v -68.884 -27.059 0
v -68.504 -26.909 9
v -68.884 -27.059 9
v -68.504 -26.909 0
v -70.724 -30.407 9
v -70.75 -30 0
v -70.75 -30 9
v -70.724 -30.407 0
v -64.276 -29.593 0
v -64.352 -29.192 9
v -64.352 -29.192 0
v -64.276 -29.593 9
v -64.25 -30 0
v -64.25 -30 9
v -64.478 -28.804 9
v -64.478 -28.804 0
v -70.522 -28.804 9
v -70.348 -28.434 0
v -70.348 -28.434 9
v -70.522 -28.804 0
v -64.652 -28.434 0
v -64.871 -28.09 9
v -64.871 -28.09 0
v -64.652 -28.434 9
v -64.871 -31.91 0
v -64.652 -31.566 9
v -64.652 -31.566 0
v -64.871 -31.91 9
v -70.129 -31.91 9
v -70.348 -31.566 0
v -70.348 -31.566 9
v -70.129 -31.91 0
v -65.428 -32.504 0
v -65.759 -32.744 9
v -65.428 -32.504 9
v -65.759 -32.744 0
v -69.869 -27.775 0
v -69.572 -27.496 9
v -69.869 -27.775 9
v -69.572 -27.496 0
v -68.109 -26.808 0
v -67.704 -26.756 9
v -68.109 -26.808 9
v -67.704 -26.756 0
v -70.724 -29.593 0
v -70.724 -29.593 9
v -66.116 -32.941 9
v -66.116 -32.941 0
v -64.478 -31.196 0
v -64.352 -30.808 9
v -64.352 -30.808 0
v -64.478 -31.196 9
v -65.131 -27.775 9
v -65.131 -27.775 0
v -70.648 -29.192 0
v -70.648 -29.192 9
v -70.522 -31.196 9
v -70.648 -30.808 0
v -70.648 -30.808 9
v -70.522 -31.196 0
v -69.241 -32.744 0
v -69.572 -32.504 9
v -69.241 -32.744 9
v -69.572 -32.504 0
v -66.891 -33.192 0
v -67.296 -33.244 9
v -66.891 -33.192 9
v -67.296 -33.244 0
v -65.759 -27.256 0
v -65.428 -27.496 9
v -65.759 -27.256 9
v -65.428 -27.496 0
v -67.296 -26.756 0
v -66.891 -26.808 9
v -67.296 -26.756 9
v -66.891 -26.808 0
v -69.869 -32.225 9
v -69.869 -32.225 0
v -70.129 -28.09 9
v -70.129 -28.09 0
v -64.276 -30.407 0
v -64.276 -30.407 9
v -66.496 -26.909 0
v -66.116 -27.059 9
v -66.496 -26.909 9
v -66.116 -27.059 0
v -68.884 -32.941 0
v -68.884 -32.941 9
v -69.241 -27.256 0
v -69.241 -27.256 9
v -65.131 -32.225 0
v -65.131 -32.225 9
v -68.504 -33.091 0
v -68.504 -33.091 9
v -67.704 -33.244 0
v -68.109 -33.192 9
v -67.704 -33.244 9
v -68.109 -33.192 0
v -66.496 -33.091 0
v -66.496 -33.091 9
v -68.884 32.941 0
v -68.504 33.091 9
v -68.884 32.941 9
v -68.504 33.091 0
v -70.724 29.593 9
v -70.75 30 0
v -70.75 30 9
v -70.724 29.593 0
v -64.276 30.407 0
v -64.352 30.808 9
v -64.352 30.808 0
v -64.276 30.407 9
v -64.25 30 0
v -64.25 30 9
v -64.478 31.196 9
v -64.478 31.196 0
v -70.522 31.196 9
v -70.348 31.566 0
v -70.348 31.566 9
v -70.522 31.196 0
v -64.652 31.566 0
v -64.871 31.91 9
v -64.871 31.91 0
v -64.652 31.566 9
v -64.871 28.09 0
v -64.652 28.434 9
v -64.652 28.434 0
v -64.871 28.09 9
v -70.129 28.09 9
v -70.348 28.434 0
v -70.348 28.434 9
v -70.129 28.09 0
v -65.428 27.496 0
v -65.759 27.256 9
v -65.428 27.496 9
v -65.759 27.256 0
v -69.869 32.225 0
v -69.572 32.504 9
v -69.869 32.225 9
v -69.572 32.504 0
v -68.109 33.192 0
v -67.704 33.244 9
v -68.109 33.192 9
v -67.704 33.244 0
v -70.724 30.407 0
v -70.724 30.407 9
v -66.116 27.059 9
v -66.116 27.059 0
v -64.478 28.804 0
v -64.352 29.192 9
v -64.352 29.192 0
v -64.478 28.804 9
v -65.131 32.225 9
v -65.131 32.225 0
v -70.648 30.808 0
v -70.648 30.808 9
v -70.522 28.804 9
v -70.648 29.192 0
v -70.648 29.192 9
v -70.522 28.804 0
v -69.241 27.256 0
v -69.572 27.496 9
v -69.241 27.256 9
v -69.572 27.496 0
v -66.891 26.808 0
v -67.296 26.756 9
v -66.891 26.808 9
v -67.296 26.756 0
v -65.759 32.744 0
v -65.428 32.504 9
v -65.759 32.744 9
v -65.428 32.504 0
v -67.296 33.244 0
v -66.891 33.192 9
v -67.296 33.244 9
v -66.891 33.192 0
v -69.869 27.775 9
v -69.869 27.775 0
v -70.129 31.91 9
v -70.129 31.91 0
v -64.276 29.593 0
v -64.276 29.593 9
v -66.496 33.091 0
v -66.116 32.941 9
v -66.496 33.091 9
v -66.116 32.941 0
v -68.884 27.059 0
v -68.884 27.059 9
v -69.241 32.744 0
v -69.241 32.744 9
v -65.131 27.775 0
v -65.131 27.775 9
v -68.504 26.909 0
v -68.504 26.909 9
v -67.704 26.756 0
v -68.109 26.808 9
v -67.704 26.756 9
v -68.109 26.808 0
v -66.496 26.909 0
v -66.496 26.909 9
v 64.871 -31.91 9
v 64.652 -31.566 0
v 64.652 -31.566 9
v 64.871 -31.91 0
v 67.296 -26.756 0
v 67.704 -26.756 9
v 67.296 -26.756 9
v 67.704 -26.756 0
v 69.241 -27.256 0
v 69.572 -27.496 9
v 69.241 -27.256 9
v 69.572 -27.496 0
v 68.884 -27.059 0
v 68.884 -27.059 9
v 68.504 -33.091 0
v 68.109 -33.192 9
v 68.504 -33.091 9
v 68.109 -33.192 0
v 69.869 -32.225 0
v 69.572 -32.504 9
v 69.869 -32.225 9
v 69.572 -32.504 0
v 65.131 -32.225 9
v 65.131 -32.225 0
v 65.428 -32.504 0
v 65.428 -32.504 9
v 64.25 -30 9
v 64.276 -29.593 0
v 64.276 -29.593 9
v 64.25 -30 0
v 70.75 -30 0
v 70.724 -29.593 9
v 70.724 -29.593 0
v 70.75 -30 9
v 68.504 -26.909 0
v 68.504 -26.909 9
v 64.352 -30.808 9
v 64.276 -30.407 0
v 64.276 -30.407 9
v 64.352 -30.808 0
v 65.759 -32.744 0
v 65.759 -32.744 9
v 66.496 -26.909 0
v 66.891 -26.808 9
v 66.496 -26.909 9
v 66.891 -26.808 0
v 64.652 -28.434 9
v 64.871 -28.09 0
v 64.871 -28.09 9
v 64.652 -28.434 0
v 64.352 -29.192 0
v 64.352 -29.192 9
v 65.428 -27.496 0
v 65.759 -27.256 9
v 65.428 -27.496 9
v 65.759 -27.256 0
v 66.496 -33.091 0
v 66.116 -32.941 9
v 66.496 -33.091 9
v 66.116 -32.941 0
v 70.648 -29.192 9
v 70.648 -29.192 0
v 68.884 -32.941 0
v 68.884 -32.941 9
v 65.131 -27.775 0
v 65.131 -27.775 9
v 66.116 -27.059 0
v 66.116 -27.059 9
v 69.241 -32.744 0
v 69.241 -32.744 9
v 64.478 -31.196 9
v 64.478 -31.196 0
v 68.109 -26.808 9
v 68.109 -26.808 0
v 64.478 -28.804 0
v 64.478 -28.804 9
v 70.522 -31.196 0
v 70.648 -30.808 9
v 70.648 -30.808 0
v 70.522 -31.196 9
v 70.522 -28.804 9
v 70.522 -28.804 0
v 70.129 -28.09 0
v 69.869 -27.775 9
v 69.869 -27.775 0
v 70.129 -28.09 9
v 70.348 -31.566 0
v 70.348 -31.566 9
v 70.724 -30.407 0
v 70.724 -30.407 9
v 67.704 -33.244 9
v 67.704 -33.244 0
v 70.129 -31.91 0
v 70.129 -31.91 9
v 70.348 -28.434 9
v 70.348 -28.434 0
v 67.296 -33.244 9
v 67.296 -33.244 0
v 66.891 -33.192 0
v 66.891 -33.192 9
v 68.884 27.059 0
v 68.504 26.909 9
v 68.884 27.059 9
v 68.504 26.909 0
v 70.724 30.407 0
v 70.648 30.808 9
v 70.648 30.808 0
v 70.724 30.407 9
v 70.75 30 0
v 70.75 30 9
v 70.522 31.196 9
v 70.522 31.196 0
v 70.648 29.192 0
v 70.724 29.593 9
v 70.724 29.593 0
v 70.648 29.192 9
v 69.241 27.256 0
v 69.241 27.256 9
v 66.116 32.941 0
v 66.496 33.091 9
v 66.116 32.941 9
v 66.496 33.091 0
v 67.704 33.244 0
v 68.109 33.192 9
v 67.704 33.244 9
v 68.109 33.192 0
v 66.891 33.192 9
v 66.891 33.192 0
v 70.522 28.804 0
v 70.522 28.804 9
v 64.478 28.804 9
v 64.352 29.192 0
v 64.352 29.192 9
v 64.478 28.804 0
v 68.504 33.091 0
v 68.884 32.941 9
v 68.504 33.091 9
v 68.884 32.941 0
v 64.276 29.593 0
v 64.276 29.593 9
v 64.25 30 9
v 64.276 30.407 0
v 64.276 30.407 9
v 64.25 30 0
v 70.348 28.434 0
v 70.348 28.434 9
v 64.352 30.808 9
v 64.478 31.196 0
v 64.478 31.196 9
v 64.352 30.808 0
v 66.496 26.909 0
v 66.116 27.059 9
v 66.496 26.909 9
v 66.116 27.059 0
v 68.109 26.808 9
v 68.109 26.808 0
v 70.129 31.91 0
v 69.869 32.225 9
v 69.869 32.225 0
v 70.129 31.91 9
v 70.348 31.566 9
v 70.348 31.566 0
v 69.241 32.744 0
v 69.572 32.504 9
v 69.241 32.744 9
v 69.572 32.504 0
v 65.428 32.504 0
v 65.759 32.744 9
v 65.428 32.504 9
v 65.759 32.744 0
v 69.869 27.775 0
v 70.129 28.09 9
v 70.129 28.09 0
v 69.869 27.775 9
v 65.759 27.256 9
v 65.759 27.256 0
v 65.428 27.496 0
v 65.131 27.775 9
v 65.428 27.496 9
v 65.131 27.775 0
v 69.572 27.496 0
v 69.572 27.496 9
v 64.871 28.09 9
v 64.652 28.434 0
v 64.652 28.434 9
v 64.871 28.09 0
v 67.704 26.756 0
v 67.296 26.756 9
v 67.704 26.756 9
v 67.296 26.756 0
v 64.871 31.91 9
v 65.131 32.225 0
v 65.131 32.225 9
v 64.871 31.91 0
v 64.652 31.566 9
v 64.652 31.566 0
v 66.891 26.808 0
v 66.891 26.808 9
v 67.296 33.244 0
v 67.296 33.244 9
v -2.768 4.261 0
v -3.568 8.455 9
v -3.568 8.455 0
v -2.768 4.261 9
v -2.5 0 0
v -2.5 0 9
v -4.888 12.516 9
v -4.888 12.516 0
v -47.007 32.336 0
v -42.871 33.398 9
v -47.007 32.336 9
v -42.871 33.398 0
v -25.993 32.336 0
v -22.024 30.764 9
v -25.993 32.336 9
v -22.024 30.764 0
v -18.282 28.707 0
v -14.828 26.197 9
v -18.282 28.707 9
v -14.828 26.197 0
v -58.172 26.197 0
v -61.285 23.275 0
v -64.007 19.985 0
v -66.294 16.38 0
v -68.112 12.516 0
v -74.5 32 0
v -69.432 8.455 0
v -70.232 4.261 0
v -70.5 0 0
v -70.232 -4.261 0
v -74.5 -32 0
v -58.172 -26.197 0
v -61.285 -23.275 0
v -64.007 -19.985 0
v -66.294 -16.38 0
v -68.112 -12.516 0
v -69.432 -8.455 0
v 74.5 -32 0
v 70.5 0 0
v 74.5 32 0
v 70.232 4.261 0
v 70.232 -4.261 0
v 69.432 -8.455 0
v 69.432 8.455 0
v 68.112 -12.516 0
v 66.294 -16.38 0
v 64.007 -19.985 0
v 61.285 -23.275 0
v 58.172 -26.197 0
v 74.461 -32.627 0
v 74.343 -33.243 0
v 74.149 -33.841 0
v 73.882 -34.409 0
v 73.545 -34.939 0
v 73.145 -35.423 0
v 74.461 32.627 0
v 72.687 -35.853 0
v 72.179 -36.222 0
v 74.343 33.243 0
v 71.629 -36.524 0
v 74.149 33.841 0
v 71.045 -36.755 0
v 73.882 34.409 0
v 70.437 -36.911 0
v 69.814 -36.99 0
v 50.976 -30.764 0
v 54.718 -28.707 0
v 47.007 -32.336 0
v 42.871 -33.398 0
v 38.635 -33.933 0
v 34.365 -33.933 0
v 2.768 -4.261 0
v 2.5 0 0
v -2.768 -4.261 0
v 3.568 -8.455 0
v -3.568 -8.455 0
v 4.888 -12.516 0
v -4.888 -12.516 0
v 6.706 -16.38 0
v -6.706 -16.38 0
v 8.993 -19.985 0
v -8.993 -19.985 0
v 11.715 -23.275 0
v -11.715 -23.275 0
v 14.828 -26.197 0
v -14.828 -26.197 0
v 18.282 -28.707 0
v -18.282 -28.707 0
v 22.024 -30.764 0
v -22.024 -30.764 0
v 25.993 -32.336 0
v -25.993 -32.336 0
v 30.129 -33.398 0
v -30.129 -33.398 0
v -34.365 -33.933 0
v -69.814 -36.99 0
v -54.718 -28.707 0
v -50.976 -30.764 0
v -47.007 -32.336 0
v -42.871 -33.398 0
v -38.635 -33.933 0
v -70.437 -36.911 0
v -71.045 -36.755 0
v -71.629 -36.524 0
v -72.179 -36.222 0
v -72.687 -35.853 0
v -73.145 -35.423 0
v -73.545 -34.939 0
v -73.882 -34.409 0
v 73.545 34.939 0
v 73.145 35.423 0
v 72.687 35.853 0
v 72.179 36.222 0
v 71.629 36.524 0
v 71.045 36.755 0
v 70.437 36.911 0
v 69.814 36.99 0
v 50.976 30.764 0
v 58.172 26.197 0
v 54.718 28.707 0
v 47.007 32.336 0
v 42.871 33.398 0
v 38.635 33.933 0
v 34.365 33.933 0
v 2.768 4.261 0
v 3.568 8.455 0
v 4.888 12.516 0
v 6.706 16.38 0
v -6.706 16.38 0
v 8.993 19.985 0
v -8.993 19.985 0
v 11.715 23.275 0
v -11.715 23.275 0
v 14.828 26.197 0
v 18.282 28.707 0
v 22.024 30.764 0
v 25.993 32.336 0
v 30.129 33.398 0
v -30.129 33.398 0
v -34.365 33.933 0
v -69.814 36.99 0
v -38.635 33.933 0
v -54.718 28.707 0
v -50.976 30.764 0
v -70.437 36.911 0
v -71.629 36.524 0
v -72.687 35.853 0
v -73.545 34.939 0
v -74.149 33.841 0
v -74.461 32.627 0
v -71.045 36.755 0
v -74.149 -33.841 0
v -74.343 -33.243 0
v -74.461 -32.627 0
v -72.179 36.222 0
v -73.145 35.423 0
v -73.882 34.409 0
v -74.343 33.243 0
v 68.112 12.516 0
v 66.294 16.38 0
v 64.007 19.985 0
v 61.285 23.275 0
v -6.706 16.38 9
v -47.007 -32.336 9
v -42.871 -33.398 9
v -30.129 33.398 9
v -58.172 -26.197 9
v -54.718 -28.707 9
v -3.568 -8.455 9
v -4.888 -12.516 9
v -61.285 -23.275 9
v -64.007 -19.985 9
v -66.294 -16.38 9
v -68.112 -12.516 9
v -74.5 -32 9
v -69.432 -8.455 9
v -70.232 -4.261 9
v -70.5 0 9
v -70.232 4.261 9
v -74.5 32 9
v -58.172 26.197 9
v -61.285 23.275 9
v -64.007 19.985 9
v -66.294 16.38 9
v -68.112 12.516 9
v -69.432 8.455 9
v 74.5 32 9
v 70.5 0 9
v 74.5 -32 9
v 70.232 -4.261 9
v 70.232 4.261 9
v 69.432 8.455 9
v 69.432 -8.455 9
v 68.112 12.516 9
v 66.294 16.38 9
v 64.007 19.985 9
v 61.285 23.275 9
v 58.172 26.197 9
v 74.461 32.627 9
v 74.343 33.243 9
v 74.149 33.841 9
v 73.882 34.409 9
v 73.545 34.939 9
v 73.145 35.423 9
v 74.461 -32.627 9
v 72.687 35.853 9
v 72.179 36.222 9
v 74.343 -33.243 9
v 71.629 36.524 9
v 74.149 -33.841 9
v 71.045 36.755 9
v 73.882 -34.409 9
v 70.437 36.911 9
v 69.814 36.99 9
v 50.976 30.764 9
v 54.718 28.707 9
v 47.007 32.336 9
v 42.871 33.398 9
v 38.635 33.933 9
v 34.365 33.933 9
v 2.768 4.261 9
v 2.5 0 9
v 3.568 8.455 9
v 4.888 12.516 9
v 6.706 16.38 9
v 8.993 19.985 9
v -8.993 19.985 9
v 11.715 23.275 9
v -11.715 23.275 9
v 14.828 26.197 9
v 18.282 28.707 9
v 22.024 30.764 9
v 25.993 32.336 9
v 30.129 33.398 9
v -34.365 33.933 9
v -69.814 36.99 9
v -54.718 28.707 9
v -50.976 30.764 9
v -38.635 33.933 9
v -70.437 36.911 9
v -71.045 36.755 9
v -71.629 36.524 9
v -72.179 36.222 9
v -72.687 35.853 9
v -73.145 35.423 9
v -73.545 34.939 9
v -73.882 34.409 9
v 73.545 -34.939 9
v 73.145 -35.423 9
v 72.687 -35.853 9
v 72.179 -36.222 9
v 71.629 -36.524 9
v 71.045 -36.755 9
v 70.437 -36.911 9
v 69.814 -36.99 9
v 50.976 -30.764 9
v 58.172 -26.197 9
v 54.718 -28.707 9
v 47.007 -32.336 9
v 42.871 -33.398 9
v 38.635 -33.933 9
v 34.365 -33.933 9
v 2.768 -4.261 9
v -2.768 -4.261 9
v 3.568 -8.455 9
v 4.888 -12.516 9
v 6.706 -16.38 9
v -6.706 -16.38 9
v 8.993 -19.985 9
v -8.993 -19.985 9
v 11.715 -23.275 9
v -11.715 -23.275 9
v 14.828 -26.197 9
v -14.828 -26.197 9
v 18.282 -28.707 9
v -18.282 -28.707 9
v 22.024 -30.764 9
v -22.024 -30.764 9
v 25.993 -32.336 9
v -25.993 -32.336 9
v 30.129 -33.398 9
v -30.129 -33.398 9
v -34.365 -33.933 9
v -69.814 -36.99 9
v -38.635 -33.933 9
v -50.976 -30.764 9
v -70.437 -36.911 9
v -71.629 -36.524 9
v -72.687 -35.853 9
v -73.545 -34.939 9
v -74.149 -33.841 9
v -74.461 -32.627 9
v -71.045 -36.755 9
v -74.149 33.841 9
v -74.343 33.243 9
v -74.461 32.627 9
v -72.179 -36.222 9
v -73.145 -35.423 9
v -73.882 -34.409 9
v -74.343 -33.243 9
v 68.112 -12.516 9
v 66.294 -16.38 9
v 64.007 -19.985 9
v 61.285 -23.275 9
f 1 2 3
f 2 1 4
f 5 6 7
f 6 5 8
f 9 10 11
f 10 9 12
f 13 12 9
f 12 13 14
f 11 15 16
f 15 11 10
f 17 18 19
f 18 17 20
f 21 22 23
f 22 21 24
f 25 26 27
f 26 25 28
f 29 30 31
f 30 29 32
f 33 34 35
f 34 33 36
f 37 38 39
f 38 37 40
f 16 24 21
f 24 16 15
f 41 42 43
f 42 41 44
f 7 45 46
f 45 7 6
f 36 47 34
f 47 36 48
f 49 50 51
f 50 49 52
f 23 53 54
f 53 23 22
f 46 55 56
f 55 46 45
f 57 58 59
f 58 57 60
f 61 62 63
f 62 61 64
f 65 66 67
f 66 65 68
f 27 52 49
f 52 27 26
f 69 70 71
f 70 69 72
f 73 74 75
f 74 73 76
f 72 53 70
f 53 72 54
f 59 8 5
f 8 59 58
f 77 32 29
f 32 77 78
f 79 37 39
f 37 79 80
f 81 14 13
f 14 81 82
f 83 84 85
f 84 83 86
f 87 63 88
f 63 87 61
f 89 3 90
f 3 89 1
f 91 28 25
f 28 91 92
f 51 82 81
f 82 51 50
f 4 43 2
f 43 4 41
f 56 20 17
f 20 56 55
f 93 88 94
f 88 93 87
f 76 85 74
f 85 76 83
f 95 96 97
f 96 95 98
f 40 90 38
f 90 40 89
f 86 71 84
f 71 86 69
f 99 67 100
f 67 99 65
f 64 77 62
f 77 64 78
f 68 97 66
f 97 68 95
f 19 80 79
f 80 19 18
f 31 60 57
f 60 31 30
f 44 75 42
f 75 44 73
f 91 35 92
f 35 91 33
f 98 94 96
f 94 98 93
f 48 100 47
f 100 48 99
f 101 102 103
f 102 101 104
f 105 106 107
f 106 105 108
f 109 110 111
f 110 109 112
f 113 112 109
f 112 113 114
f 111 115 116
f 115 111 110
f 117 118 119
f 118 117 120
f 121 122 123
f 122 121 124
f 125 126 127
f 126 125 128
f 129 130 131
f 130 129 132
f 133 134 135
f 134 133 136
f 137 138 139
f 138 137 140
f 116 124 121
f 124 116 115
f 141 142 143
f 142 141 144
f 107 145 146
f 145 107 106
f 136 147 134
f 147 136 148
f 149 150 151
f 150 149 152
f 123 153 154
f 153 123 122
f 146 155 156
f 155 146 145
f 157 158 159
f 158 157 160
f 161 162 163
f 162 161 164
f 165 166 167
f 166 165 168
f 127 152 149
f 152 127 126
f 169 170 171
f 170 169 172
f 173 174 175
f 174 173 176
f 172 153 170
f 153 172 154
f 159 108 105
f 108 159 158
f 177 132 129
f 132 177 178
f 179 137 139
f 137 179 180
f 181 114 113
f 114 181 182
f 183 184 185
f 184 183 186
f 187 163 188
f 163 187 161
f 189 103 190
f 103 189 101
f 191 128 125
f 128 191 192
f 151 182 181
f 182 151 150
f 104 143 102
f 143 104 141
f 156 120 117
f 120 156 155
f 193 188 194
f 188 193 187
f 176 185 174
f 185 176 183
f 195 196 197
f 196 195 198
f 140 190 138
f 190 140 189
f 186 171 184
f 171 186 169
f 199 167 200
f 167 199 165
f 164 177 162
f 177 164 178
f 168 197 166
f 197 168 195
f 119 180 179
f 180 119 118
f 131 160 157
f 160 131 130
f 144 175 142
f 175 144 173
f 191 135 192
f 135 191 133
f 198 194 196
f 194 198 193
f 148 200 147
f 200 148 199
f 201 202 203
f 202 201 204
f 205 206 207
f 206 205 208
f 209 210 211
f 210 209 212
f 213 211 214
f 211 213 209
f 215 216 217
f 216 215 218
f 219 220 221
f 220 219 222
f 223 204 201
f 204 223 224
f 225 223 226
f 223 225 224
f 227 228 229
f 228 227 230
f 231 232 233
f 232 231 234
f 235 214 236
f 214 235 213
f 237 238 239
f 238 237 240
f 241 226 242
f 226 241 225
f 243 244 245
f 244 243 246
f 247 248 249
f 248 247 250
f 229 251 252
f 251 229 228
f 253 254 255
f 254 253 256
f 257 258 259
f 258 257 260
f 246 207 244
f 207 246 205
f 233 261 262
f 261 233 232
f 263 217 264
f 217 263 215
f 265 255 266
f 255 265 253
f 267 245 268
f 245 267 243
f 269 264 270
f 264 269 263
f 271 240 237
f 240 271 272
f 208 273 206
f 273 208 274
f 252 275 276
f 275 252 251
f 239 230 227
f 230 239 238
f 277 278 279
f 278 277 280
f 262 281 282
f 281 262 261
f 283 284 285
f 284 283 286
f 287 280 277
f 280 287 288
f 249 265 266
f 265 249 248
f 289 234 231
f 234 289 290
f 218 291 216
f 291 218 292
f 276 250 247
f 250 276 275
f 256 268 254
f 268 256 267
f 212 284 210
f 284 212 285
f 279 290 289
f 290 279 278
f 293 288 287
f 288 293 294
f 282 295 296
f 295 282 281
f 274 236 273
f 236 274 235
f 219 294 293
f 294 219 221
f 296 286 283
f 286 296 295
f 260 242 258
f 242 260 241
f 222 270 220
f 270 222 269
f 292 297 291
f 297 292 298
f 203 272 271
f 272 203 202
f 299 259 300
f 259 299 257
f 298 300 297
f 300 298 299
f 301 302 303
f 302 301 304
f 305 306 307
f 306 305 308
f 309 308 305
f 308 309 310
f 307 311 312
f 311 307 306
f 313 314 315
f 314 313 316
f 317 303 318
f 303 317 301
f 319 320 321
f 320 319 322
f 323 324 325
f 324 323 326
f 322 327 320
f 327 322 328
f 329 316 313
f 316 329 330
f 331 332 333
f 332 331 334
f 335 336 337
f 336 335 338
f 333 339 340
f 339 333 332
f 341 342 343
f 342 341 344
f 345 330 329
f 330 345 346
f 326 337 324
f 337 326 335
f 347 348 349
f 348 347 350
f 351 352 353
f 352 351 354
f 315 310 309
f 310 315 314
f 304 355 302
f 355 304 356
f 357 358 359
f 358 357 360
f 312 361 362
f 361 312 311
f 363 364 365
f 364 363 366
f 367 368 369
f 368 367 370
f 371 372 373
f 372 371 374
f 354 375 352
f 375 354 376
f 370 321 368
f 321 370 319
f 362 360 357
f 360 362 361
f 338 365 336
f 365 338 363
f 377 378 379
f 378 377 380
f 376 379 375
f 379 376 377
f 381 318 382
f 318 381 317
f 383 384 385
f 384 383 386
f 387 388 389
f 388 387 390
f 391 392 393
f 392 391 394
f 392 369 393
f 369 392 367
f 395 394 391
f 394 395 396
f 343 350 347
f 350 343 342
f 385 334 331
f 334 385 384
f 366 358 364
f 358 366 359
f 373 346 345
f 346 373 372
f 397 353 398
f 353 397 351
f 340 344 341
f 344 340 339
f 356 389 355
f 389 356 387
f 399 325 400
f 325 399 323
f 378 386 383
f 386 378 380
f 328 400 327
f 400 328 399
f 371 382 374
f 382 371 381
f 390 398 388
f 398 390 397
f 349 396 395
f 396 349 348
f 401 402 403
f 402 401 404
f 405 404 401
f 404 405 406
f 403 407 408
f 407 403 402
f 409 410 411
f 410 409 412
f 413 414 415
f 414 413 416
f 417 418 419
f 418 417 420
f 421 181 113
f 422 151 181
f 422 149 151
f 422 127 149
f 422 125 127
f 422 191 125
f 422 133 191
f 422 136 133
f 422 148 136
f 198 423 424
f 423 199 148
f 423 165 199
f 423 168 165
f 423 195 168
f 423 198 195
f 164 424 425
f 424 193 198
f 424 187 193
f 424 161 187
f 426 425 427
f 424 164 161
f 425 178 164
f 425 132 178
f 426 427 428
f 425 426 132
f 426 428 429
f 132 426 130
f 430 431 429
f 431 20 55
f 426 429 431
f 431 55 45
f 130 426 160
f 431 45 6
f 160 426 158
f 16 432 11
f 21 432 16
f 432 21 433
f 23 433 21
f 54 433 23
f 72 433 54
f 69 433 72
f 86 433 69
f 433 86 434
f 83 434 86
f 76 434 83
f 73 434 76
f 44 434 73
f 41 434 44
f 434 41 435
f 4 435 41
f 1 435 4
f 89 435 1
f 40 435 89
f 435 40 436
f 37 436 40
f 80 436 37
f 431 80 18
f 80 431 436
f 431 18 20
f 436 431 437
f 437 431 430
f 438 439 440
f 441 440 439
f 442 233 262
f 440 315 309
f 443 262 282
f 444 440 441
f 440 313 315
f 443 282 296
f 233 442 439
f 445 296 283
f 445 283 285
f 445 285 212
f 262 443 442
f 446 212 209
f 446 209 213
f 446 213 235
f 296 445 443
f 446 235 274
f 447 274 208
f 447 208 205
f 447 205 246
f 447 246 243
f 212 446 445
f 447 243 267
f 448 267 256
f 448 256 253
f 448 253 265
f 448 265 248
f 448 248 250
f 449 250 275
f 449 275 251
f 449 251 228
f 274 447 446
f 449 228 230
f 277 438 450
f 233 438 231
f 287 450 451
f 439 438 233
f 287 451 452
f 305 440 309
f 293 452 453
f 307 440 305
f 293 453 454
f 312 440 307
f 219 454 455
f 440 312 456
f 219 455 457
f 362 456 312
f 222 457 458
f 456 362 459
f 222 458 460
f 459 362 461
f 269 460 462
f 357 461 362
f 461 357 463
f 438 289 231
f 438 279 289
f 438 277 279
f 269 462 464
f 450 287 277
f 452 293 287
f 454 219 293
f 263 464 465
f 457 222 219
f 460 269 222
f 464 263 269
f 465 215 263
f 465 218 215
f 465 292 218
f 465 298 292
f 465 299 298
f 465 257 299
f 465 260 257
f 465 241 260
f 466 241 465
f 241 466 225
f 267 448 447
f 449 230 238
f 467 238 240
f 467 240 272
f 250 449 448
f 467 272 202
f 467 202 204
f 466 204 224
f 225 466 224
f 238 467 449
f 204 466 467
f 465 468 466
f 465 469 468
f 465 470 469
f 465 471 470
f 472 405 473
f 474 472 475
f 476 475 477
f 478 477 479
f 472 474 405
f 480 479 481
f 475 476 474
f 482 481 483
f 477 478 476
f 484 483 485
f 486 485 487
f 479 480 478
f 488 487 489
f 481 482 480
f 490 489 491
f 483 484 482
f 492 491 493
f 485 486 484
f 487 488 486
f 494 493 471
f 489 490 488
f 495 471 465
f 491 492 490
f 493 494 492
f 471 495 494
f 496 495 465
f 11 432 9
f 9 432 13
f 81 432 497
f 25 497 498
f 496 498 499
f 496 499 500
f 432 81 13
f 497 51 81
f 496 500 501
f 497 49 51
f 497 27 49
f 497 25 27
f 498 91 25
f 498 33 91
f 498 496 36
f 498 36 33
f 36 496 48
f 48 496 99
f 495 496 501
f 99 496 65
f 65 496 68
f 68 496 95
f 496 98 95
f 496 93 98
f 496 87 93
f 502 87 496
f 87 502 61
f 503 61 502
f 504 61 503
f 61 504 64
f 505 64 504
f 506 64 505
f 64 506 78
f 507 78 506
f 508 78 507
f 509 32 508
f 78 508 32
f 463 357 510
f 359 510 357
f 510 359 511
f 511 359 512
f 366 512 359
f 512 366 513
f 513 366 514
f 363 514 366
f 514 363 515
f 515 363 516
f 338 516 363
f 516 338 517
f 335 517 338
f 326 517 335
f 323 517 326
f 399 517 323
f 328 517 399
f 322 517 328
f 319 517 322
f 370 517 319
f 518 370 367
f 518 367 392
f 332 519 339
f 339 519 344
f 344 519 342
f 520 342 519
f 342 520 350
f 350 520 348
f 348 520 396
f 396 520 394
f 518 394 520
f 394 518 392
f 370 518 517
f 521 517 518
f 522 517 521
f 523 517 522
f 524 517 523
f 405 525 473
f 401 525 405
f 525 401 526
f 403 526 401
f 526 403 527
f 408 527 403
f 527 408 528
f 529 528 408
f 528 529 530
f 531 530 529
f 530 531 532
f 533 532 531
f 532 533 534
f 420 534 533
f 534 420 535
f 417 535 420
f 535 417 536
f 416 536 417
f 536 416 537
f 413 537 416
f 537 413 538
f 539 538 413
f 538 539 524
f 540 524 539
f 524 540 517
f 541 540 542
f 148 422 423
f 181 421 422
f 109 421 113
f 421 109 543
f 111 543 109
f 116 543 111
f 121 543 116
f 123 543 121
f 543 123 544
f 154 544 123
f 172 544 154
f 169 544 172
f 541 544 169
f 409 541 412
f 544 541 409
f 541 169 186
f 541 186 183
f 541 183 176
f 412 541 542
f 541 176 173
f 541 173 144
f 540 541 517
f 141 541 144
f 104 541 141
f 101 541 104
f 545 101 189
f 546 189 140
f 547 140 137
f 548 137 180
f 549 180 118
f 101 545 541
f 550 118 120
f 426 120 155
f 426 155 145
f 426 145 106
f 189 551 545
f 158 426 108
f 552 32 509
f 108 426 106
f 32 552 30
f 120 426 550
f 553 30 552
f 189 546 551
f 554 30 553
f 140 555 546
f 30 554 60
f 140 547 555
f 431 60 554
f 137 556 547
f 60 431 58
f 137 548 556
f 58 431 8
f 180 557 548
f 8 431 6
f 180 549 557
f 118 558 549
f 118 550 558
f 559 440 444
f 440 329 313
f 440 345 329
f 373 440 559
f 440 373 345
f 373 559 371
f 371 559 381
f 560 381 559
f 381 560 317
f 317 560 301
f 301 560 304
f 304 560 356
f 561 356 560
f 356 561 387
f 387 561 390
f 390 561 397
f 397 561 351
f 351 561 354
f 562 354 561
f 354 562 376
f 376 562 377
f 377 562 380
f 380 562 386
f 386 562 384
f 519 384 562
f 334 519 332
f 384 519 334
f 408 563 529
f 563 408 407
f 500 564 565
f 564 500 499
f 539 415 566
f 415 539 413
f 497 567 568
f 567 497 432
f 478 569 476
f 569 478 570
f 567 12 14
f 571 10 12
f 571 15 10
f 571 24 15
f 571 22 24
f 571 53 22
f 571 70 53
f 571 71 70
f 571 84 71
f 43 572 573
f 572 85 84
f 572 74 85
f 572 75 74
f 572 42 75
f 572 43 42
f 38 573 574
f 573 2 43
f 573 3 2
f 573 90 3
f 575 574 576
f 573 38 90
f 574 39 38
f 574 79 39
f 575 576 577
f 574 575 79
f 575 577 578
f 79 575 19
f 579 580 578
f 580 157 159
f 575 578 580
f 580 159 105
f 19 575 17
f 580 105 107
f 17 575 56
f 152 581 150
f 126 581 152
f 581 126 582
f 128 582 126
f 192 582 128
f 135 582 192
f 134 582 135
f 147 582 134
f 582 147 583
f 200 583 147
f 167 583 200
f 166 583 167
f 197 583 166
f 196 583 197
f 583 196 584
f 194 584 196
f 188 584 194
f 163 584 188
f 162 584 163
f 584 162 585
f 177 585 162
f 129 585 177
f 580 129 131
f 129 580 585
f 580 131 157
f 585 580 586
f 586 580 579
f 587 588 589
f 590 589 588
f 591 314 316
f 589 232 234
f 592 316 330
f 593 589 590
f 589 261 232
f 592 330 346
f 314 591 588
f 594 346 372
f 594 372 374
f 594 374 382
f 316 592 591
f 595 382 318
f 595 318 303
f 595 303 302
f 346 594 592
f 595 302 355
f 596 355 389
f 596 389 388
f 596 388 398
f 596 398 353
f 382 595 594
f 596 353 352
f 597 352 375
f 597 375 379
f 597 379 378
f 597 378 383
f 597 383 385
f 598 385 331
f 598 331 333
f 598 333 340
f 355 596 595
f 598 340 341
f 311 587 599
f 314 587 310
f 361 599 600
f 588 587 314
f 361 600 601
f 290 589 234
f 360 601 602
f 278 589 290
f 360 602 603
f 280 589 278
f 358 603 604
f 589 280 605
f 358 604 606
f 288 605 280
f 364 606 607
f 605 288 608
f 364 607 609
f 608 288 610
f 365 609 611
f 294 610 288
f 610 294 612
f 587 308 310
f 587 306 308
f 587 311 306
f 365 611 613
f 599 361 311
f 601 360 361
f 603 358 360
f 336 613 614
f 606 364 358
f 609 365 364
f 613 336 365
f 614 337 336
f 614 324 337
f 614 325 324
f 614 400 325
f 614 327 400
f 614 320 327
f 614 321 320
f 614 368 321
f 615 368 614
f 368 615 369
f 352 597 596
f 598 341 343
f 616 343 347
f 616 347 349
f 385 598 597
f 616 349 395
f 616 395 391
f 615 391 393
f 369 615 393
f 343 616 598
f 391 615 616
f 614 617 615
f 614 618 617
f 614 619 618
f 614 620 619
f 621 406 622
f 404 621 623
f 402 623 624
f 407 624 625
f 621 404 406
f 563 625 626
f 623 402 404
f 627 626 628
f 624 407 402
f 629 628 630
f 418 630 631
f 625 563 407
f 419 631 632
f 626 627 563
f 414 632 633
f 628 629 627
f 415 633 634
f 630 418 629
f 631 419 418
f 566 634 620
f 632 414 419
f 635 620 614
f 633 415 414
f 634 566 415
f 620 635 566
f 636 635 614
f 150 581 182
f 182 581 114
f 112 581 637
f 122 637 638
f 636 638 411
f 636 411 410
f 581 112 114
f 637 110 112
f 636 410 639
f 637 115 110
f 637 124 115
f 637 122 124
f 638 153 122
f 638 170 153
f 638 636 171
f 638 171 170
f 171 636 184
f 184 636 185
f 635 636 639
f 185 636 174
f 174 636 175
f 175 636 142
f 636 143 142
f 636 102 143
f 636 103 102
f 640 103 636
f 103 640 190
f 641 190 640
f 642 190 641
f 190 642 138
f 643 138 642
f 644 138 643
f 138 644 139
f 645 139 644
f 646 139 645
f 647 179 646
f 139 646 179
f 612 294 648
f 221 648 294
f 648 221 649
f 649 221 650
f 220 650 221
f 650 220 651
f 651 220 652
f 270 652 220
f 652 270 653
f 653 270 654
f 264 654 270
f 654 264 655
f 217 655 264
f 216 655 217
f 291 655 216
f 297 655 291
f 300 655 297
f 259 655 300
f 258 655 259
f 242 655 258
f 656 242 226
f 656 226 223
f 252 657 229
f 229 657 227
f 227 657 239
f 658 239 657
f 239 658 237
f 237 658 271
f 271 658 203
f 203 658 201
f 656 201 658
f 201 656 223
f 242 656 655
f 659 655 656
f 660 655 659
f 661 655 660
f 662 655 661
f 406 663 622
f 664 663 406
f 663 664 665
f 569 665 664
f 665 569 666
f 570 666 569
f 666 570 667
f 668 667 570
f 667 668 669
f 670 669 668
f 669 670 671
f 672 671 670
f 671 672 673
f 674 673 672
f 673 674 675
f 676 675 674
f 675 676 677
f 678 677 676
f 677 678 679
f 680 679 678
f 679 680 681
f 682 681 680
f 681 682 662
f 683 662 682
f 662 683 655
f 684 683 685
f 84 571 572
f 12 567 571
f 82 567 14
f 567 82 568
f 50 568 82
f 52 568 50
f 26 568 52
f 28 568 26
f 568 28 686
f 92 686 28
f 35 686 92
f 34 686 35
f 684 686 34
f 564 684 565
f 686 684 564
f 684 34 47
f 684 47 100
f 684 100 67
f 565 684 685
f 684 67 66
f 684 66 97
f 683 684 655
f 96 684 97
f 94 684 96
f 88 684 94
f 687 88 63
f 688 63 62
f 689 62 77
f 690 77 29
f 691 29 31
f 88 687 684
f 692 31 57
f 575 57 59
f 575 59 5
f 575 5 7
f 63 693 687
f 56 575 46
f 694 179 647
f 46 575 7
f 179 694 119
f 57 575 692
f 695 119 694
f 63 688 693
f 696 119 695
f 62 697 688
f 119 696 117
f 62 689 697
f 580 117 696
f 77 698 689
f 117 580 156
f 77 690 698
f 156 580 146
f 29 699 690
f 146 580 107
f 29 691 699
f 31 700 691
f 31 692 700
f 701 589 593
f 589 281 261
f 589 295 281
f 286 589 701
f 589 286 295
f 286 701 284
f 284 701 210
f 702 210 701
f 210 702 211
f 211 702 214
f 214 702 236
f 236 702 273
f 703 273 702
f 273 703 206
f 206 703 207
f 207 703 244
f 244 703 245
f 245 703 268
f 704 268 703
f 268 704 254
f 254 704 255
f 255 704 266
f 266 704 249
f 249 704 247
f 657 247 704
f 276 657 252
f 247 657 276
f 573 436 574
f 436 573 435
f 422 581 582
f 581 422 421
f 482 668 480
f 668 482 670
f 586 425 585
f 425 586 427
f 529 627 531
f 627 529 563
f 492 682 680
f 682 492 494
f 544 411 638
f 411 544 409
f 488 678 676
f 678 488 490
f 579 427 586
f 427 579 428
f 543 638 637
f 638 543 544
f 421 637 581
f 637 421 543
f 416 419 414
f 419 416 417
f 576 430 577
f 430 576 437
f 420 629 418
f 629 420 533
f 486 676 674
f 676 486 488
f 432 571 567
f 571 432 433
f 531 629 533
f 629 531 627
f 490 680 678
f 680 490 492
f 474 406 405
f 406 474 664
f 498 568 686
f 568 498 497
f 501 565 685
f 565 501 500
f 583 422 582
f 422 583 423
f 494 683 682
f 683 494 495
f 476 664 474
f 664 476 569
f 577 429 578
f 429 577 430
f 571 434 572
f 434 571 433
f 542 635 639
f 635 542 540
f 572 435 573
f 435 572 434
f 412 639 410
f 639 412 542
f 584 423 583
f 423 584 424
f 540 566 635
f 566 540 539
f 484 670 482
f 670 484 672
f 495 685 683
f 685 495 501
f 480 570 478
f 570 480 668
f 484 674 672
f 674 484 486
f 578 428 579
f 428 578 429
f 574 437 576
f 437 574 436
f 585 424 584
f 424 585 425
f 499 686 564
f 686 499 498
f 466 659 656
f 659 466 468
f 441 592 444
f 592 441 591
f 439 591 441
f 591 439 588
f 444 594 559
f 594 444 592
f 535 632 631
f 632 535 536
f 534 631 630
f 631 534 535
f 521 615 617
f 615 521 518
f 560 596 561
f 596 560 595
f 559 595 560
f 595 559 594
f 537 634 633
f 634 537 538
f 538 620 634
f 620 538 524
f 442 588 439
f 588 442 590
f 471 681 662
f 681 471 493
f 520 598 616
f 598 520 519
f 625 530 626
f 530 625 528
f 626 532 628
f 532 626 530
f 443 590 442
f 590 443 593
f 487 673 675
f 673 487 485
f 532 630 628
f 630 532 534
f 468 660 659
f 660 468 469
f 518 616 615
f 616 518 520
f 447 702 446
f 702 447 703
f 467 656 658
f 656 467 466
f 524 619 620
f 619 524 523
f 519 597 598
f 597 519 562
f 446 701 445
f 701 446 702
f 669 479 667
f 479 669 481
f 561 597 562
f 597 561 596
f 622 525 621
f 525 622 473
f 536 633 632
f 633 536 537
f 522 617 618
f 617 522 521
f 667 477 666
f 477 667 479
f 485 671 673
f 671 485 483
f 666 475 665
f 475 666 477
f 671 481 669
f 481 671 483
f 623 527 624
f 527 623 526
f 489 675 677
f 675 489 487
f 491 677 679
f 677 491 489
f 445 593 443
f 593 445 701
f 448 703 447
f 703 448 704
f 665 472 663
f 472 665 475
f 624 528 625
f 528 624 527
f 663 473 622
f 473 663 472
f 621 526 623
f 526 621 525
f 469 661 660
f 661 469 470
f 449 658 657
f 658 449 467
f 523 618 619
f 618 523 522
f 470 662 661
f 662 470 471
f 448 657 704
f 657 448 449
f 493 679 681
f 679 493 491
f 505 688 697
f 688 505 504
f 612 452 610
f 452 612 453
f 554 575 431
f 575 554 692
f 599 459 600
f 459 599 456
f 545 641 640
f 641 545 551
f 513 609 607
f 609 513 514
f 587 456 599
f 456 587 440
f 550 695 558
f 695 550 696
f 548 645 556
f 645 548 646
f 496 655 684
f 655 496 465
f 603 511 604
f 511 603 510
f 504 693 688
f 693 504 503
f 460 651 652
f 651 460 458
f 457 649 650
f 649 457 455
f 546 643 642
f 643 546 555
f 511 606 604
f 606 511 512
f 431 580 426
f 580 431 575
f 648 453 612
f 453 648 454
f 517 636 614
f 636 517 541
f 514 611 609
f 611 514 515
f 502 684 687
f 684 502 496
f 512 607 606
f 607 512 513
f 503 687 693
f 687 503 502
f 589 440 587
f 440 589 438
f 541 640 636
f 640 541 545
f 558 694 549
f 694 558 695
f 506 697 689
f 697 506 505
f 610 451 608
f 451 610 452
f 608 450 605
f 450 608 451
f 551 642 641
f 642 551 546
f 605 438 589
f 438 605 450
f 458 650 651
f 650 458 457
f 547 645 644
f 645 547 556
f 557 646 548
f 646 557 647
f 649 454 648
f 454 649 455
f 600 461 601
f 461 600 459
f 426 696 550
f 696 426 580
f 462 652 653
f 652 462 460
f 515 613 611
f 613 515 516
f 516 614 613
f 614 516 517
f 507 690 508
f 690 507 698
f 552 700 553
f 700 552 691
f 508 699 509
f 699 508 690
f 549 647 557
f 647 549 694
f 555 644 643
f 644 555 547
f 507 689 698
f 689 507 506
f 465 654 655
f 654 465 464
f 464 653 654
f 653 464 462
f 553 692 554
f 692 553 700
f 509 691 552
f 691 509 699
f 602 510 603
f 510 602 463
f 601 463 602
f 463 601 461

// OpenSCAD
$fn = 50;


difference() {
	union() {
		hull() {
			translate(v = [-69.5000000000, 32.0000000000, 0]) {
				cylinder(h = 9, r = 5);
			}
			translate(v = [69.5000000000, 32.0000000000, 0]) {
				cylinder(h = 9, r = 5);
			}
			translate(v = [-69.5000000000, -32.0000000000, 0]) {
				cylinder(h = 9, r = 5);
			}
			translate(v = [69.5000000000, -32.0000000000, 0]) {
				cylinder(h = 9, r = 5);
			}
		}
	}
	union() {
		#translate(v = [-67.5000000000, -30.0000000000, -100.0000000000]) {
			cylinder(h = 200, r = 3.2500000000);
		}
		#translate(v = [-67.5000000000, 30.0000000000, -100.0000000000]) {
			cylinder(h = 200, r = 3.2500000000);
		}
		#translate(v = [67.5000000000, -30.0000000000, -100.0000000000]) {
			cylinder(h = 200, r = 3.2500000000);
		}
		#translate(v = [67.5000000000, 30.0000000000, -100.0000000000]) {
			cylinder(h = 200, r = 3.2500000000);
		}
		#translate(v = [-36.5000000000, 0, 0]) {
			cylinder(h = 9, r = 34.0000000000);
		}
		#translate(v = [36.5000000000, 0, 0]) {
			cylinder(h = 9, r = 34.0000000000);
		}
	}
}
